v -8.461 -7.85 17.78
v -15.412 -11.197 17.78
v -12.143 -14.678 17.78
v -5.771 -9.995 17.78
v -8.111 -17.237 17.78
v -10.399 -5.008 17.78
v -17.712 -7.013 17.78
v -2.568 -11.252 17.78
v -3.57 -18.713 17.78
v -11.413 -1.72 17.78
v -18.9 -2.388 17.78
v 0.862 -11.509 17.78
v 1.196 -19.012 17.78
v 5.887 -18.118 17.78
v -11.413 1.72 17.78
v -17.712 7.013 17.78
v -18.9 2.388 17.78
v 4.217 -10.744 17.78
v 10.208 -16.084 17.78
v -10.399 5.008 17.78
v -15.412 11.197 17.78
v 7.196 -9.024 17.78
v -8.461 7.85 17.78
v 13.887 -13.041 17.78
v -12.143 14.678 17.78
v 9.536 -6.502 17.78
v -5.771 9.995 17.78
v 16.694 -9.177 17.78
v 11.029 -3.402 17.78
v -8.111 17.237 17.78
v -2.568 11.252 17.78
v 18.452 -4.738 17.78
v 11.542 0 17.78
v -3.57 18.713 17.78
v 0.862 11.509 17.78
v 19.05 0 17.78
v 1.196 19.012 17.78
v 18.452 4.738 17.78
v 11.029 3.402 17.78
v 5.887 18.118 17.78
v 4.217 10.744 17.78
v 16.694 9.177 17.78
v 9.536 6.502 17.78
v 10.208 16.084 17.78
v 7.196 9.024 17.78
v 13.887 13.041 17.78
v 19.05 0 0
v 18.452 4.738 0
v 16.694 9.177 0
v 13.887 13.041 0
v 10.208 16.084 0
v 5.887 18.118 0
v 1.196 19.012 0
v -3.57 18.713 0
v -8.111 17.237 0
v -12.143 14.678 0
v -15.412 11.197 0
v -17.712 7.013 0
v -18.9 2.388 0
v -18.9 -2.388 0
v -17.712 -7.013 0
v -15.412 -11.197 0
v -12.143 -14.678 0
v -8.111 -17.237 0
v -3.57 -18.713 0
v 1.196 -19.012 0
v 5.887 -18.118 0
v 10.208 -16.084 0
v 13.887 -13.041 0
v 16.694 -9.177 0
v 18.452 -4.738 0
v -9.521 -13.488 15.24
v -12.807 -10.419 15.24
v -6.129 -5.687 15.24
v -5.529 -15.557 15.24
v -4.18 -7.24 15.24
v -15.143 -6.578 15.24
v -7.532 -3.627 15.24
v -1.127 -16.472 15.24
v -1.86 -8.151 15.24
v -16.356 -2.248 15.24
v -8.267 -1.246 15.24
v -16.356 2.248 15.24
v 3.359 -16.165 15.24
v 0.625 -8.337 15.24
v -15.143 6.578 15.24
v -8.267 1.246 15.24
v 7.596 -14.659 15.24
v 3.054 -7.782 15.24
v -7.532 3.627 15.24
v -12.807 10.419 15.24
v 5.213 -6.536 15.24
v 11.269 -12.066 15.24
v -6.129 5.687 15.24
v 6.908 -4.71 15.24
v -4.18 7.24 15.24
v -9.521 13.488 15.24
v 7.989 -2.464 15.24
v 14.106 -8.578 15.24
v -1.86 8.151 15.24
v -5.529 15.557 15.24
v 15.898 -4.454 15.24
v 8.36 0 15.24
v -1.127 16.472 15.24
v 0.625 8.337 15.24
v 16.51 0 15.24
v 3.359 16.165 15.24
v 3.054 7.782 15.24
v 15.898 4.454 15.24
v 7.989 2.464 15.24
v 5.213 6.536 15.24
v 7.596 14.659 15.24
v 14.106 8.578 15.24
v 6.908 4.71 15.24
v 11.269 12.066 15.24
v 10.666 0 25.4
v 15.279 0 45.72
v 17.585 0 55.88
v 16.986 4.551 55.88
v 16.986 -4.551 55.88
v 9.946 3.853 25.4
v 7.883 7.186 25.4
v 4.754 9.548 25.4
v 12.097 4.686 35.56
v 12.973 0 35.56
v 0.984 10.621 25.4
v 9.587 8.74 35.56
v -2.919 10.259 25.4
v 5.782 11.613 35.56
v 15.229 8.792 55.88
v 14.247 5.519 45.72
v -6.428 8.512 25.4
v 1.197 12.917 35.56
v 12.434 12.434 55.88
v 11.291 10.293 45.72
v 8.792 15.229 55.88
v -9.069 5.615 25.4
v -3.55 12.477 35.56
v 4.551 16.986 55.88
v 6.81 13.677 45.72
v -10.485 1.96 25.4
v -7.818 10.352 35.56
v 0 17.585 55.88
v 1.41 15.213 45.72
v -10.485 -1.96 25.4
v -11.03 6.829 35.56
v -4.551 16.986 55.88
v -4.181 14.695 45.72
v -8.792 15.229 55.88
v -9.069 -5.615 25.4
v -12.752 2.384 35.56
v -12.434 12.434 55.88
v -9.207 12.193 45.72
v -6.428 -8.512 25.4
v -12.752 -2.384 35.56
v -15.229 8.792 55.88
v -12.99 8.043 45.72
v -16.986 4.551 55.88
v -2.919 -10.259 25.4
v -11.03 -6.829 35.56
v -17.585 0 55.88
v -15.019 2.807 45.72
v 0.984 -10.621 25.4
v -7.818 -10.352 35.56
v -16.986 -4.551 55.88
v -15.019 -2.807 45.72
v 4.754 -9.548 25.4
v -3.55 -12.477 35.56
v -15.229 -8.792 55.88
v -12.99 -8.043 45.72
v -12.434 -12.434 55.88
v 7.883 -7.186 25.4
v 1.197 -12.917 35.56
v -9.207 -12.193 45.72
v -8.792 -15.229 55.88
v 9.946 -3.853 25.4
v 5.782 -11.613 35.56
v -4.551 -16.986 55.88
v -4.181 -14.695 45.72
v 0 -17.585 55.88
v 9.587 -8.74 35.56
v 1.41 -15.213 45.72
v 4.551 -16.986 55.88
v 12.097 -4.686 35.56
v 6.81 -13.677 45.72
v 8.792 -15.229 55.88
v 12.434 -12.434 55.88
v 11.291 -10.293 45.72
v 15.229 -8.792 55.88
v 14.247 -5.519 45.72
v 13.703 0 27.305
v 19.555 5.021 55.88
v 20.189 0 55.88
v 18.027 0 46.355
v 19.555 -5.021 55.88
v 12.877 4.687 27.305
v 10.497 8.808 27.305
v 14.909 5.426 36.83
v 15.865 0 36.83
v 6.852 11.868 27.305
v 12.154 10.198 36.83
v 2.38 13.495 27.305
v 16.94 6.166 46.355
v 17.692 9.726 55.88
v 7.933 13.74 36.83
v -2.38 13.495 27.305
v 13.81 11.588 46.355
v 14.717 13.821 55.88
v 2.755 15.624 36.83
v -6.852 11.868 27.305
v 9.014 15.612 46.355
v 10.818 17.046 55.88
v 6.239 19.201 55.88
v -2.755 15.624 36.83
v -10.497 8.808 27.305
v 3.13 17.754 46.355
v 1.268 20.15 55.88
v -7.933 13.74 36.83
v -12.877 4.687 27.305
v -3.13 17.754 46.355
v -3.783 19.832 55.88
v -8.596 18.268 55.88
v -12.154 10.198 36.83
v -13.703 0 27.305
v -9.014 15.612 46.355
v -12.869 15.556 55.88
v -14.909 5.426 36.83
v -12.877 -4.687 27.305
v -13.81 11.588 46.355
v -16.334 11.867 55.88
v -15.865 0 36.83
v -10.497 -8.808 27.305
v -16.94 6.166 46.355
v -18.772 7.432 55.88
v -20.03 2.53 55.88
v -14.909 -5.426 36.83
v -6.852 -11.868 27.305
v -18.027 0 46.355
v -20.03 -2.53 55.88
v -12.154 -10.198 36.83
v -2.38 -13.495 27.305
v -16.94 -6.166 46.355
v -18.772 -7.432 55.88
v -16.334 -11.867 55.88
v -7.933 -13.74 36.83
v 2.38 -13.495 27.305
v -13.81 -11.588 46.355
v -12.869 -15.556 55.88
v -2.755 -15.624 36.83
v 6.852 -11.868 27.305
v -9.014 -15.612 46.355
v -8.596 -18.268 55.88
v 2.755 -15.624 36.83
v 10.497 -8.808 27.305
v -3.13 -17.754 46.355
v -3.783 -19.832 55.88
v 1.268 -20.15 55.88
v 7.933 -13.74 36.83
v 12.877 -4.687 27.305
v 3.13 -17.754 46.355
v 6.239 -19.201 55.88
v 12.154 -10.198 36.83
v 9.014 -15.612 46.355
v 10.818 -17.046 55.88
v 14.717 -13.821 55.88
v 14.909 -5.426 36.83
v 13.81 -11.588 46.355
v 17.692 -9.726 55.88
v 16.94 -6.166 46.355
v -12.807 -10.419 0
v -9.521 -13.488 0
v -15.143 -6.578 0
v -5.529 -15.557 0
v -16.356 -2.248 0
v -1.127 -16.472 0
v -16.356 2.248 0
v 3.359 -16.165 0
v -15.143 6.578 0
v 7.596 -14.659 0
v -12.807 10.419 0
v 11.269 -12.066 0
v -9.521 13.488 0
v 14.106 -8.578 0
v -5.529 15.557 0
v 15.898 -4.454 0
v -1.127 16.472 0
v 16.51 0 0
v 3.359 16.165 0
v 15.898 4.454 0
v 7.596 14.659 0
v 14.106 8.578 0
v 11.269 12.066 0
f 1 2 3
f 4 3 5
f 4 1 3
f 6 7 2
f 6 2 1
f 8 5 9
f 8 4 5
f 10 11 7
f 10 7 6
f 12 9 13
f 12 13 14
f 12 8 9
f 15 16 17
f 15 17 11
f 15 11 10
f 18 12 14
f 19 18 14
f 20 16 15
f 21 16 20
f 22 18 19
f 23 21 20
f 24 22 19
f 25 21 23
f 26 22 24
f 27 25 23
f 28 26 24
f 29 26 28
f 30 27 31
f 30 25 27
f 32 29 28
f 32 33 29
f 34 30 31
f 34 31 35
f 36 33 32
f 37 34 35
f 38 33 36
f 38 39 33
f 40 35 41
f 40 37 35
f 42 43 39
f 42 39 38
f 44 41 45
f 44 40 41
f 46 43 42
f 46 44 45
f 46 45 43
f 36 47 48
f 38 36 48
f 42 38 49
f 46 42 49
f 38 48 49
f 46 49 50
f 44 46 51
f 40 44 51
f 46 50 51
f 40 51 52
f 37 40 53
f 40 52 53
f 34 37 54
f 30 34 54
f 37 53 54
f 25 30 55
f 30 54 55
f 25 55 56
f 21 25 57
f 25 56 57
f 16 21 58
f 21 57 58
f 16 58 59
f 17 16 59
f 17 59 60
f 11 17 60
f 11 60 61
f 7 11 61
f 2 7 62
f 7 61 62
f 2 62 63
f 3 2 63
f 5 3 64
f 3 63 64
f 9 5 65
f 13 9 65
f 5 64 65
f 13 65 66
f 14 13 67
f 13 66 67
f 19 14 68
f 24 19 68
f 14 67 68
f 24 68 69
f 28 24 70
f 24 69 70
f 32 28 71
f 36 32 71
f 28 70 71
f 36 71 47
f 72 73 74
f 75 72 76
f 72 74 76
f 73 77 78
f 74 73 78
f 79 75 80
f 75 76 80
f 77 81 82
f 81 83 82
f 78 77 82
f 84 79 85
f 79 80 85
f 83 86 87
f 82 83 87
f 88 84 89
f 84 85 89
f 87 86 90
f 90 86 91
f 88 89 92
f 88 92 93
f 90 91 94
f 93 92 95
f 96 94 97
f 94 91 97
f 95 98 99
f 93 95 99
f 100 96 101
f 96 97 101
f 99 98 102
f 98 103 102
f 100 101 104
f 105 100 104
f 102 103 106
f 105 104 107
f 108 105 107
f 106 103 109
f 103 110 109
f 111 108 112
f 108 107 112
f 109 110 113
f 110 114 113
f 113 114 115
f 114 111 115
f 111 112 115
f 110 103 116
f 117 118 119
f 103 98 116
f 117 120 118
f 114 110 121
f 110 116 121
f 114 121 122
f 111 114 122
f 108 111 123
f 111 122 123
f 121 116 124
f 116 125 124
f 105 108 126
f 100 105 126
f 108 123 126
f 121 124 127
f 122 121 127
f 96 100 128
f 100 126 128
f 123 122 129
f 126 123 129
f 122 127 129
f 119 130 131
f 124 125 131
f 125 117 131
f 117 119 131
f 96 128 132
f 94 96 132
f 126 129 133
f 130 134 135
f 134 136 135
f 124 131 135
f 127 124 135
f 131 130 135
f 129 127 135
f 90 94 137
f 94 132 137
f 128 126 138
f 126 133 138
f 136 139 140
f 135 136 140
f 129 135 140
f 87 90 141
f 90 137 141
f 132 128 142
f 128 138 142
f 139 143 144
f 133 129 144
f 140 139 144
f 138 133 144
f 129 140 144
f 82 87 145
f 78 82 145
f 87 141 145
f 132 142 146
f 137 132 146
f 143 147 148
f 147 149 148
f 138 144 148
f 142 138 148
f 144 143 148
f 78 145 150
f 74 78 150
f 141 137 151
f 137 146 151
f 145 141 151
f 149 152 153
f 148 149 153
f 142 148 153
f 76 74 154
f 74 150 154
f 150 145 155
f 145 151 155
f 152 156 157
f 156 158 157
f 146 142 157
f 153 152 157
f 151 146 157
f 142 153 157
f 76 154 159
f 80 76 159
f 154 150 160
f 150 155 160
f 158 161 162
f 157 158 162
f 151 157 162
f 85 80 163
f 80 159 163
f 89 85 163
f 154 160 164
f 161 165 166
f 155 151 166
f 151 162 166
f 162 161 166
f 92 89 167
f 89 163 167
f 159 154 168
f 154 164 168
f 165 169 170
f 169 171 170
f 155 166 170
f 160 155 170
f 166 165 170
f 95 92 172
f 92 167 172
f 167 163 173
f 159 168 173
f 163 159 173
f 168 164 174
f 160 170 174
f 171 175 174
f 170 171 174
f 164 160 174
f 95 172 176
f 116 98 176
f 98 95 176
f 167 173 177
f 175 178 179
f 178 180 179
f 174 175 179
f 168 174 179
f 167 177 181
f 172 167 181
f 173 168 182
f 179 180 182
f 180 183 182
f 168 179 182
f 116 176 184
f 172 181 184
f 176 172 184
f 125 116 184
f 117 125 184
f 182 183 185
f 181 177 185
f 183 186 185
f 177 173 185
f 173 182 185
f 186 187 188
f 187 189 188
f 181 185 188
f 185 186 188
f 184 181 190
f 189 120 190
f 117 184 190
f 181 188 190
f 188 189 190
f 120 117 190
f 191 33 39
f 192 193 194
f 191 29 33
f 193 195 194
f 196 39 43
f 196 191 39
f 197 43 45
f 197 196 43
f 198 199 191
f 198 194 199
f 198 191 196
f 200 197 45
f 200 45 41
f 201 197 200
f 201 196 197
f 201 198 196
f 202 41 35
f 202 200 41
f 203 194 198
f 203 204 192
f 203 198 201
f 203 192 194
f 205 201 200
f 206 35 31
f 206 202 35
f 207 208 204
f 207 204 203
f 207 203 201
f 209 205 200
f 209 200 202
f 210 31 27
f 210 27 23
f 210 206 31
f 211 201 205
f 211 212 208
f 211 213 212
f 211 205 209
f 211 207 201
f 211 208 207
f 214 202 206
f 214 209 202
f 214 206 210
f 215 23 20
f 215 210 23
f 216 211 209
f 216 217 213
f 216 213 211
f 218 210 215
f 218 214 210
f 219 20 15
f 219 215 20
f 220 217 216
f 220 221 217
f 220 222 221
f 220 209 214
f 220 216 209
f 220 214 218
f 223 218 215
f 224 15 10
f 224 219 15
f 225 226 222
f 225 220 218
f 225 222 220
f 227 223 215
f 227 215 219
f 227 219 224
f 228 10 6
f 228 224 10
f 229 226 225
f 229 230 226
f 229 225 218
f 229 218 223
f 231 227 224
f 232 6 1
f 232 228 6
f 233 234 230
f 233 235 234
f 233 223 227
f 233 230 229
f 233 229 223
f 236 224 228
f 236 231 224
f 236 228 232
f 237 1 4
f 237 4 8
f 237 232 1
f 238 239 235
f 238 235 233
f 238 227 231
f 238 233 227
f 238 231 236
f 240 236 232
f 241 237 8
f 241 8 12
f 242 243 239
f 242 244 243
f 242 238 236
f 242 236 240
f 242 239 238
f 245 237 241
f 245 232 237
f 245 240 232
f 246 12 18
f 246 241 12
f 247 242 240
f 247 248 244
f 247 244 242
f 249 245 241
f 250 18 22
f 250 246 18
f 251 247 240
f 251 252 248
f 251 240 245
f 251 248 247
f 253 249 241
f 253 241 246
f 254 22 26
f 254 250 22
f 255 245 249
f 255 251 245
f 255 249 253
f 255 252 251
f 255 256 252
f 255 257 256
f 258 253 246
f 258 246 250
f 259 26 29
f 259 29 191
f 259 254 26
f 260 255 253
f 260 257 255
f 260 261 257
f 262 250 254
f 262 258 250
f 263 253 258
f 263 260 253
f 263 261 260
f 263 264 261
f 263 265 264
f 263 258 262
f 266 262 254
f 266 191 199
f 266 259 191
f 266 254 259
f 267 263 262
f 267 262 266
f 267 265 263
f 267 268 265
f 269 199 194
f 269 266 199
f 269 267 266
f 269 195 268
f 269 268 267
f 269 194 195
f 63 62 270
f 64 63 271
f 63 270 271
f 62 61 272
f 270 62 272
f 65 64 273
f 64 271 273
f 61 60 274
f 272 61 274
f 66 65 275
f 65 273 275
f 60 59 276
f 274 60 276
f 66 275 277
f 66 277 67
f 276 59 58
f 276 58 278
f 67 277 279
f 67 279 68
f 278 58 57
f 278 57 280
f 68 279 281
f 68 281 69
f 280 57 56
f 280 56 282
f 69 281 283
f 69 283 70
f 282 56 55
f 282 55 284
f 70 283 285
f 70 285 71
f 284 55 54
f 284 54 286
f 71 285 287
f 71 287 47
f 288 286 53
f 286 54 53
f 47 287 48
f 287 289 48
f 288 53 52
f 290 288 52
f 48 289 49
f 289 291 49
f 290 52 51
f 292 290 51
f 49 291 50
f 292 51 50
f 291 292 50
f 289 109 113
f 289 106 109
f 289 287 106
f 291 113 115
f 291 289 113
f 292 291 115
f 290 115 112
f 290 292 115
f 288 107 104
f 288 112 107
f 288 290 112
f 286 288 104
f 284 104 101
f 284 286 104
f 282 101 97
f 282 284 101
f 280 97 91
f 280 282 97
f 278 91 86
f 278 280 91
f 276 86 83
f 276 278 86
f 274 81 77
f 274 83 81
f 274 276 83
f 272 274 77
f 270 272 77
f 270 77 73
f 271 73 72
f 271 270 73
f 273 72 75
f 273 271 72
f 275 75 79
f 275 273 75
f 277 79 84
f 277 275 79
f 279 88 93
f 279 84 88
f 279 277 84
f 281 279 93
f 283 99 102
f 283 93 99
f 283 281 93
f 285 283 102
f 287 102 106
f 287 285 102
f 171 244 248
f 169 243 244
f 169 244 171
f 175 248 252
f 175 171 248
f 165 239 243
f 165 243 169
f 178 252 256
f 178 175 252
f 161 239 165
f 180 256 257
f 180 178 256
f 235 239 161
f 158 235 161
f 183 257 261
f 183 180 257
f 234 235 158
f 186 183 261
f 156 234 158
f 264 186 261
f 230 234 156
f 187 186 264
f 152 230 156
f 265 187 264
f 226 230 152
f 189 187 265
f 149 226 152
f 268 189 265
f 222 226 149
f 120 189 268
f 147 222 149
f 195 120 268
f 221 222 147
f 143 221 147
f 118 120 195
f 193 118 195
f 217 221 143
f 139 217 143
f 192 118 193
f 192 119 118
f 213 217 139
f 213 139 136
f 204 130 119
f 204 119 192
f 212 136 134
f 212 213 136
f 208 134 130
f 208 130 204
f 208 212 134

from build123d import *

# Parameters (mm, degrees)
F0_R     = 19.05
F1_DEPTH = 17.78
F4_R     = 11.5415113059
F3_R     = 20.1893668286
F6_T     = -2.54


with BuildPart() as f1:
    # F0 (on Top) → F1 (new body)
    with BuildSketch(Plane.XY):
        Circle(F0_R)
    extrude(amount=F1_DEPTH)

    # F4 (on face) → F5 section 0
    with BuildSketch(Plane.XY.offset(17.78)):
        Circle(F4_R)
    # F3 (on offset) → F5 section 1
    with BuildSketch(Plane.XY.offset(55.88)):
        Circle(F3_R)
    loft()

    # F6
    f6_openings = [f1.faces().sort_by_distance(p)[0] for p in [
        (0, 0, 0),
        (0, 0, 55.88),
    ]]
    offset(amount=F6_T, openings=f6_openings, kind=Kind.INTERSECTION)


solid = f1.part
